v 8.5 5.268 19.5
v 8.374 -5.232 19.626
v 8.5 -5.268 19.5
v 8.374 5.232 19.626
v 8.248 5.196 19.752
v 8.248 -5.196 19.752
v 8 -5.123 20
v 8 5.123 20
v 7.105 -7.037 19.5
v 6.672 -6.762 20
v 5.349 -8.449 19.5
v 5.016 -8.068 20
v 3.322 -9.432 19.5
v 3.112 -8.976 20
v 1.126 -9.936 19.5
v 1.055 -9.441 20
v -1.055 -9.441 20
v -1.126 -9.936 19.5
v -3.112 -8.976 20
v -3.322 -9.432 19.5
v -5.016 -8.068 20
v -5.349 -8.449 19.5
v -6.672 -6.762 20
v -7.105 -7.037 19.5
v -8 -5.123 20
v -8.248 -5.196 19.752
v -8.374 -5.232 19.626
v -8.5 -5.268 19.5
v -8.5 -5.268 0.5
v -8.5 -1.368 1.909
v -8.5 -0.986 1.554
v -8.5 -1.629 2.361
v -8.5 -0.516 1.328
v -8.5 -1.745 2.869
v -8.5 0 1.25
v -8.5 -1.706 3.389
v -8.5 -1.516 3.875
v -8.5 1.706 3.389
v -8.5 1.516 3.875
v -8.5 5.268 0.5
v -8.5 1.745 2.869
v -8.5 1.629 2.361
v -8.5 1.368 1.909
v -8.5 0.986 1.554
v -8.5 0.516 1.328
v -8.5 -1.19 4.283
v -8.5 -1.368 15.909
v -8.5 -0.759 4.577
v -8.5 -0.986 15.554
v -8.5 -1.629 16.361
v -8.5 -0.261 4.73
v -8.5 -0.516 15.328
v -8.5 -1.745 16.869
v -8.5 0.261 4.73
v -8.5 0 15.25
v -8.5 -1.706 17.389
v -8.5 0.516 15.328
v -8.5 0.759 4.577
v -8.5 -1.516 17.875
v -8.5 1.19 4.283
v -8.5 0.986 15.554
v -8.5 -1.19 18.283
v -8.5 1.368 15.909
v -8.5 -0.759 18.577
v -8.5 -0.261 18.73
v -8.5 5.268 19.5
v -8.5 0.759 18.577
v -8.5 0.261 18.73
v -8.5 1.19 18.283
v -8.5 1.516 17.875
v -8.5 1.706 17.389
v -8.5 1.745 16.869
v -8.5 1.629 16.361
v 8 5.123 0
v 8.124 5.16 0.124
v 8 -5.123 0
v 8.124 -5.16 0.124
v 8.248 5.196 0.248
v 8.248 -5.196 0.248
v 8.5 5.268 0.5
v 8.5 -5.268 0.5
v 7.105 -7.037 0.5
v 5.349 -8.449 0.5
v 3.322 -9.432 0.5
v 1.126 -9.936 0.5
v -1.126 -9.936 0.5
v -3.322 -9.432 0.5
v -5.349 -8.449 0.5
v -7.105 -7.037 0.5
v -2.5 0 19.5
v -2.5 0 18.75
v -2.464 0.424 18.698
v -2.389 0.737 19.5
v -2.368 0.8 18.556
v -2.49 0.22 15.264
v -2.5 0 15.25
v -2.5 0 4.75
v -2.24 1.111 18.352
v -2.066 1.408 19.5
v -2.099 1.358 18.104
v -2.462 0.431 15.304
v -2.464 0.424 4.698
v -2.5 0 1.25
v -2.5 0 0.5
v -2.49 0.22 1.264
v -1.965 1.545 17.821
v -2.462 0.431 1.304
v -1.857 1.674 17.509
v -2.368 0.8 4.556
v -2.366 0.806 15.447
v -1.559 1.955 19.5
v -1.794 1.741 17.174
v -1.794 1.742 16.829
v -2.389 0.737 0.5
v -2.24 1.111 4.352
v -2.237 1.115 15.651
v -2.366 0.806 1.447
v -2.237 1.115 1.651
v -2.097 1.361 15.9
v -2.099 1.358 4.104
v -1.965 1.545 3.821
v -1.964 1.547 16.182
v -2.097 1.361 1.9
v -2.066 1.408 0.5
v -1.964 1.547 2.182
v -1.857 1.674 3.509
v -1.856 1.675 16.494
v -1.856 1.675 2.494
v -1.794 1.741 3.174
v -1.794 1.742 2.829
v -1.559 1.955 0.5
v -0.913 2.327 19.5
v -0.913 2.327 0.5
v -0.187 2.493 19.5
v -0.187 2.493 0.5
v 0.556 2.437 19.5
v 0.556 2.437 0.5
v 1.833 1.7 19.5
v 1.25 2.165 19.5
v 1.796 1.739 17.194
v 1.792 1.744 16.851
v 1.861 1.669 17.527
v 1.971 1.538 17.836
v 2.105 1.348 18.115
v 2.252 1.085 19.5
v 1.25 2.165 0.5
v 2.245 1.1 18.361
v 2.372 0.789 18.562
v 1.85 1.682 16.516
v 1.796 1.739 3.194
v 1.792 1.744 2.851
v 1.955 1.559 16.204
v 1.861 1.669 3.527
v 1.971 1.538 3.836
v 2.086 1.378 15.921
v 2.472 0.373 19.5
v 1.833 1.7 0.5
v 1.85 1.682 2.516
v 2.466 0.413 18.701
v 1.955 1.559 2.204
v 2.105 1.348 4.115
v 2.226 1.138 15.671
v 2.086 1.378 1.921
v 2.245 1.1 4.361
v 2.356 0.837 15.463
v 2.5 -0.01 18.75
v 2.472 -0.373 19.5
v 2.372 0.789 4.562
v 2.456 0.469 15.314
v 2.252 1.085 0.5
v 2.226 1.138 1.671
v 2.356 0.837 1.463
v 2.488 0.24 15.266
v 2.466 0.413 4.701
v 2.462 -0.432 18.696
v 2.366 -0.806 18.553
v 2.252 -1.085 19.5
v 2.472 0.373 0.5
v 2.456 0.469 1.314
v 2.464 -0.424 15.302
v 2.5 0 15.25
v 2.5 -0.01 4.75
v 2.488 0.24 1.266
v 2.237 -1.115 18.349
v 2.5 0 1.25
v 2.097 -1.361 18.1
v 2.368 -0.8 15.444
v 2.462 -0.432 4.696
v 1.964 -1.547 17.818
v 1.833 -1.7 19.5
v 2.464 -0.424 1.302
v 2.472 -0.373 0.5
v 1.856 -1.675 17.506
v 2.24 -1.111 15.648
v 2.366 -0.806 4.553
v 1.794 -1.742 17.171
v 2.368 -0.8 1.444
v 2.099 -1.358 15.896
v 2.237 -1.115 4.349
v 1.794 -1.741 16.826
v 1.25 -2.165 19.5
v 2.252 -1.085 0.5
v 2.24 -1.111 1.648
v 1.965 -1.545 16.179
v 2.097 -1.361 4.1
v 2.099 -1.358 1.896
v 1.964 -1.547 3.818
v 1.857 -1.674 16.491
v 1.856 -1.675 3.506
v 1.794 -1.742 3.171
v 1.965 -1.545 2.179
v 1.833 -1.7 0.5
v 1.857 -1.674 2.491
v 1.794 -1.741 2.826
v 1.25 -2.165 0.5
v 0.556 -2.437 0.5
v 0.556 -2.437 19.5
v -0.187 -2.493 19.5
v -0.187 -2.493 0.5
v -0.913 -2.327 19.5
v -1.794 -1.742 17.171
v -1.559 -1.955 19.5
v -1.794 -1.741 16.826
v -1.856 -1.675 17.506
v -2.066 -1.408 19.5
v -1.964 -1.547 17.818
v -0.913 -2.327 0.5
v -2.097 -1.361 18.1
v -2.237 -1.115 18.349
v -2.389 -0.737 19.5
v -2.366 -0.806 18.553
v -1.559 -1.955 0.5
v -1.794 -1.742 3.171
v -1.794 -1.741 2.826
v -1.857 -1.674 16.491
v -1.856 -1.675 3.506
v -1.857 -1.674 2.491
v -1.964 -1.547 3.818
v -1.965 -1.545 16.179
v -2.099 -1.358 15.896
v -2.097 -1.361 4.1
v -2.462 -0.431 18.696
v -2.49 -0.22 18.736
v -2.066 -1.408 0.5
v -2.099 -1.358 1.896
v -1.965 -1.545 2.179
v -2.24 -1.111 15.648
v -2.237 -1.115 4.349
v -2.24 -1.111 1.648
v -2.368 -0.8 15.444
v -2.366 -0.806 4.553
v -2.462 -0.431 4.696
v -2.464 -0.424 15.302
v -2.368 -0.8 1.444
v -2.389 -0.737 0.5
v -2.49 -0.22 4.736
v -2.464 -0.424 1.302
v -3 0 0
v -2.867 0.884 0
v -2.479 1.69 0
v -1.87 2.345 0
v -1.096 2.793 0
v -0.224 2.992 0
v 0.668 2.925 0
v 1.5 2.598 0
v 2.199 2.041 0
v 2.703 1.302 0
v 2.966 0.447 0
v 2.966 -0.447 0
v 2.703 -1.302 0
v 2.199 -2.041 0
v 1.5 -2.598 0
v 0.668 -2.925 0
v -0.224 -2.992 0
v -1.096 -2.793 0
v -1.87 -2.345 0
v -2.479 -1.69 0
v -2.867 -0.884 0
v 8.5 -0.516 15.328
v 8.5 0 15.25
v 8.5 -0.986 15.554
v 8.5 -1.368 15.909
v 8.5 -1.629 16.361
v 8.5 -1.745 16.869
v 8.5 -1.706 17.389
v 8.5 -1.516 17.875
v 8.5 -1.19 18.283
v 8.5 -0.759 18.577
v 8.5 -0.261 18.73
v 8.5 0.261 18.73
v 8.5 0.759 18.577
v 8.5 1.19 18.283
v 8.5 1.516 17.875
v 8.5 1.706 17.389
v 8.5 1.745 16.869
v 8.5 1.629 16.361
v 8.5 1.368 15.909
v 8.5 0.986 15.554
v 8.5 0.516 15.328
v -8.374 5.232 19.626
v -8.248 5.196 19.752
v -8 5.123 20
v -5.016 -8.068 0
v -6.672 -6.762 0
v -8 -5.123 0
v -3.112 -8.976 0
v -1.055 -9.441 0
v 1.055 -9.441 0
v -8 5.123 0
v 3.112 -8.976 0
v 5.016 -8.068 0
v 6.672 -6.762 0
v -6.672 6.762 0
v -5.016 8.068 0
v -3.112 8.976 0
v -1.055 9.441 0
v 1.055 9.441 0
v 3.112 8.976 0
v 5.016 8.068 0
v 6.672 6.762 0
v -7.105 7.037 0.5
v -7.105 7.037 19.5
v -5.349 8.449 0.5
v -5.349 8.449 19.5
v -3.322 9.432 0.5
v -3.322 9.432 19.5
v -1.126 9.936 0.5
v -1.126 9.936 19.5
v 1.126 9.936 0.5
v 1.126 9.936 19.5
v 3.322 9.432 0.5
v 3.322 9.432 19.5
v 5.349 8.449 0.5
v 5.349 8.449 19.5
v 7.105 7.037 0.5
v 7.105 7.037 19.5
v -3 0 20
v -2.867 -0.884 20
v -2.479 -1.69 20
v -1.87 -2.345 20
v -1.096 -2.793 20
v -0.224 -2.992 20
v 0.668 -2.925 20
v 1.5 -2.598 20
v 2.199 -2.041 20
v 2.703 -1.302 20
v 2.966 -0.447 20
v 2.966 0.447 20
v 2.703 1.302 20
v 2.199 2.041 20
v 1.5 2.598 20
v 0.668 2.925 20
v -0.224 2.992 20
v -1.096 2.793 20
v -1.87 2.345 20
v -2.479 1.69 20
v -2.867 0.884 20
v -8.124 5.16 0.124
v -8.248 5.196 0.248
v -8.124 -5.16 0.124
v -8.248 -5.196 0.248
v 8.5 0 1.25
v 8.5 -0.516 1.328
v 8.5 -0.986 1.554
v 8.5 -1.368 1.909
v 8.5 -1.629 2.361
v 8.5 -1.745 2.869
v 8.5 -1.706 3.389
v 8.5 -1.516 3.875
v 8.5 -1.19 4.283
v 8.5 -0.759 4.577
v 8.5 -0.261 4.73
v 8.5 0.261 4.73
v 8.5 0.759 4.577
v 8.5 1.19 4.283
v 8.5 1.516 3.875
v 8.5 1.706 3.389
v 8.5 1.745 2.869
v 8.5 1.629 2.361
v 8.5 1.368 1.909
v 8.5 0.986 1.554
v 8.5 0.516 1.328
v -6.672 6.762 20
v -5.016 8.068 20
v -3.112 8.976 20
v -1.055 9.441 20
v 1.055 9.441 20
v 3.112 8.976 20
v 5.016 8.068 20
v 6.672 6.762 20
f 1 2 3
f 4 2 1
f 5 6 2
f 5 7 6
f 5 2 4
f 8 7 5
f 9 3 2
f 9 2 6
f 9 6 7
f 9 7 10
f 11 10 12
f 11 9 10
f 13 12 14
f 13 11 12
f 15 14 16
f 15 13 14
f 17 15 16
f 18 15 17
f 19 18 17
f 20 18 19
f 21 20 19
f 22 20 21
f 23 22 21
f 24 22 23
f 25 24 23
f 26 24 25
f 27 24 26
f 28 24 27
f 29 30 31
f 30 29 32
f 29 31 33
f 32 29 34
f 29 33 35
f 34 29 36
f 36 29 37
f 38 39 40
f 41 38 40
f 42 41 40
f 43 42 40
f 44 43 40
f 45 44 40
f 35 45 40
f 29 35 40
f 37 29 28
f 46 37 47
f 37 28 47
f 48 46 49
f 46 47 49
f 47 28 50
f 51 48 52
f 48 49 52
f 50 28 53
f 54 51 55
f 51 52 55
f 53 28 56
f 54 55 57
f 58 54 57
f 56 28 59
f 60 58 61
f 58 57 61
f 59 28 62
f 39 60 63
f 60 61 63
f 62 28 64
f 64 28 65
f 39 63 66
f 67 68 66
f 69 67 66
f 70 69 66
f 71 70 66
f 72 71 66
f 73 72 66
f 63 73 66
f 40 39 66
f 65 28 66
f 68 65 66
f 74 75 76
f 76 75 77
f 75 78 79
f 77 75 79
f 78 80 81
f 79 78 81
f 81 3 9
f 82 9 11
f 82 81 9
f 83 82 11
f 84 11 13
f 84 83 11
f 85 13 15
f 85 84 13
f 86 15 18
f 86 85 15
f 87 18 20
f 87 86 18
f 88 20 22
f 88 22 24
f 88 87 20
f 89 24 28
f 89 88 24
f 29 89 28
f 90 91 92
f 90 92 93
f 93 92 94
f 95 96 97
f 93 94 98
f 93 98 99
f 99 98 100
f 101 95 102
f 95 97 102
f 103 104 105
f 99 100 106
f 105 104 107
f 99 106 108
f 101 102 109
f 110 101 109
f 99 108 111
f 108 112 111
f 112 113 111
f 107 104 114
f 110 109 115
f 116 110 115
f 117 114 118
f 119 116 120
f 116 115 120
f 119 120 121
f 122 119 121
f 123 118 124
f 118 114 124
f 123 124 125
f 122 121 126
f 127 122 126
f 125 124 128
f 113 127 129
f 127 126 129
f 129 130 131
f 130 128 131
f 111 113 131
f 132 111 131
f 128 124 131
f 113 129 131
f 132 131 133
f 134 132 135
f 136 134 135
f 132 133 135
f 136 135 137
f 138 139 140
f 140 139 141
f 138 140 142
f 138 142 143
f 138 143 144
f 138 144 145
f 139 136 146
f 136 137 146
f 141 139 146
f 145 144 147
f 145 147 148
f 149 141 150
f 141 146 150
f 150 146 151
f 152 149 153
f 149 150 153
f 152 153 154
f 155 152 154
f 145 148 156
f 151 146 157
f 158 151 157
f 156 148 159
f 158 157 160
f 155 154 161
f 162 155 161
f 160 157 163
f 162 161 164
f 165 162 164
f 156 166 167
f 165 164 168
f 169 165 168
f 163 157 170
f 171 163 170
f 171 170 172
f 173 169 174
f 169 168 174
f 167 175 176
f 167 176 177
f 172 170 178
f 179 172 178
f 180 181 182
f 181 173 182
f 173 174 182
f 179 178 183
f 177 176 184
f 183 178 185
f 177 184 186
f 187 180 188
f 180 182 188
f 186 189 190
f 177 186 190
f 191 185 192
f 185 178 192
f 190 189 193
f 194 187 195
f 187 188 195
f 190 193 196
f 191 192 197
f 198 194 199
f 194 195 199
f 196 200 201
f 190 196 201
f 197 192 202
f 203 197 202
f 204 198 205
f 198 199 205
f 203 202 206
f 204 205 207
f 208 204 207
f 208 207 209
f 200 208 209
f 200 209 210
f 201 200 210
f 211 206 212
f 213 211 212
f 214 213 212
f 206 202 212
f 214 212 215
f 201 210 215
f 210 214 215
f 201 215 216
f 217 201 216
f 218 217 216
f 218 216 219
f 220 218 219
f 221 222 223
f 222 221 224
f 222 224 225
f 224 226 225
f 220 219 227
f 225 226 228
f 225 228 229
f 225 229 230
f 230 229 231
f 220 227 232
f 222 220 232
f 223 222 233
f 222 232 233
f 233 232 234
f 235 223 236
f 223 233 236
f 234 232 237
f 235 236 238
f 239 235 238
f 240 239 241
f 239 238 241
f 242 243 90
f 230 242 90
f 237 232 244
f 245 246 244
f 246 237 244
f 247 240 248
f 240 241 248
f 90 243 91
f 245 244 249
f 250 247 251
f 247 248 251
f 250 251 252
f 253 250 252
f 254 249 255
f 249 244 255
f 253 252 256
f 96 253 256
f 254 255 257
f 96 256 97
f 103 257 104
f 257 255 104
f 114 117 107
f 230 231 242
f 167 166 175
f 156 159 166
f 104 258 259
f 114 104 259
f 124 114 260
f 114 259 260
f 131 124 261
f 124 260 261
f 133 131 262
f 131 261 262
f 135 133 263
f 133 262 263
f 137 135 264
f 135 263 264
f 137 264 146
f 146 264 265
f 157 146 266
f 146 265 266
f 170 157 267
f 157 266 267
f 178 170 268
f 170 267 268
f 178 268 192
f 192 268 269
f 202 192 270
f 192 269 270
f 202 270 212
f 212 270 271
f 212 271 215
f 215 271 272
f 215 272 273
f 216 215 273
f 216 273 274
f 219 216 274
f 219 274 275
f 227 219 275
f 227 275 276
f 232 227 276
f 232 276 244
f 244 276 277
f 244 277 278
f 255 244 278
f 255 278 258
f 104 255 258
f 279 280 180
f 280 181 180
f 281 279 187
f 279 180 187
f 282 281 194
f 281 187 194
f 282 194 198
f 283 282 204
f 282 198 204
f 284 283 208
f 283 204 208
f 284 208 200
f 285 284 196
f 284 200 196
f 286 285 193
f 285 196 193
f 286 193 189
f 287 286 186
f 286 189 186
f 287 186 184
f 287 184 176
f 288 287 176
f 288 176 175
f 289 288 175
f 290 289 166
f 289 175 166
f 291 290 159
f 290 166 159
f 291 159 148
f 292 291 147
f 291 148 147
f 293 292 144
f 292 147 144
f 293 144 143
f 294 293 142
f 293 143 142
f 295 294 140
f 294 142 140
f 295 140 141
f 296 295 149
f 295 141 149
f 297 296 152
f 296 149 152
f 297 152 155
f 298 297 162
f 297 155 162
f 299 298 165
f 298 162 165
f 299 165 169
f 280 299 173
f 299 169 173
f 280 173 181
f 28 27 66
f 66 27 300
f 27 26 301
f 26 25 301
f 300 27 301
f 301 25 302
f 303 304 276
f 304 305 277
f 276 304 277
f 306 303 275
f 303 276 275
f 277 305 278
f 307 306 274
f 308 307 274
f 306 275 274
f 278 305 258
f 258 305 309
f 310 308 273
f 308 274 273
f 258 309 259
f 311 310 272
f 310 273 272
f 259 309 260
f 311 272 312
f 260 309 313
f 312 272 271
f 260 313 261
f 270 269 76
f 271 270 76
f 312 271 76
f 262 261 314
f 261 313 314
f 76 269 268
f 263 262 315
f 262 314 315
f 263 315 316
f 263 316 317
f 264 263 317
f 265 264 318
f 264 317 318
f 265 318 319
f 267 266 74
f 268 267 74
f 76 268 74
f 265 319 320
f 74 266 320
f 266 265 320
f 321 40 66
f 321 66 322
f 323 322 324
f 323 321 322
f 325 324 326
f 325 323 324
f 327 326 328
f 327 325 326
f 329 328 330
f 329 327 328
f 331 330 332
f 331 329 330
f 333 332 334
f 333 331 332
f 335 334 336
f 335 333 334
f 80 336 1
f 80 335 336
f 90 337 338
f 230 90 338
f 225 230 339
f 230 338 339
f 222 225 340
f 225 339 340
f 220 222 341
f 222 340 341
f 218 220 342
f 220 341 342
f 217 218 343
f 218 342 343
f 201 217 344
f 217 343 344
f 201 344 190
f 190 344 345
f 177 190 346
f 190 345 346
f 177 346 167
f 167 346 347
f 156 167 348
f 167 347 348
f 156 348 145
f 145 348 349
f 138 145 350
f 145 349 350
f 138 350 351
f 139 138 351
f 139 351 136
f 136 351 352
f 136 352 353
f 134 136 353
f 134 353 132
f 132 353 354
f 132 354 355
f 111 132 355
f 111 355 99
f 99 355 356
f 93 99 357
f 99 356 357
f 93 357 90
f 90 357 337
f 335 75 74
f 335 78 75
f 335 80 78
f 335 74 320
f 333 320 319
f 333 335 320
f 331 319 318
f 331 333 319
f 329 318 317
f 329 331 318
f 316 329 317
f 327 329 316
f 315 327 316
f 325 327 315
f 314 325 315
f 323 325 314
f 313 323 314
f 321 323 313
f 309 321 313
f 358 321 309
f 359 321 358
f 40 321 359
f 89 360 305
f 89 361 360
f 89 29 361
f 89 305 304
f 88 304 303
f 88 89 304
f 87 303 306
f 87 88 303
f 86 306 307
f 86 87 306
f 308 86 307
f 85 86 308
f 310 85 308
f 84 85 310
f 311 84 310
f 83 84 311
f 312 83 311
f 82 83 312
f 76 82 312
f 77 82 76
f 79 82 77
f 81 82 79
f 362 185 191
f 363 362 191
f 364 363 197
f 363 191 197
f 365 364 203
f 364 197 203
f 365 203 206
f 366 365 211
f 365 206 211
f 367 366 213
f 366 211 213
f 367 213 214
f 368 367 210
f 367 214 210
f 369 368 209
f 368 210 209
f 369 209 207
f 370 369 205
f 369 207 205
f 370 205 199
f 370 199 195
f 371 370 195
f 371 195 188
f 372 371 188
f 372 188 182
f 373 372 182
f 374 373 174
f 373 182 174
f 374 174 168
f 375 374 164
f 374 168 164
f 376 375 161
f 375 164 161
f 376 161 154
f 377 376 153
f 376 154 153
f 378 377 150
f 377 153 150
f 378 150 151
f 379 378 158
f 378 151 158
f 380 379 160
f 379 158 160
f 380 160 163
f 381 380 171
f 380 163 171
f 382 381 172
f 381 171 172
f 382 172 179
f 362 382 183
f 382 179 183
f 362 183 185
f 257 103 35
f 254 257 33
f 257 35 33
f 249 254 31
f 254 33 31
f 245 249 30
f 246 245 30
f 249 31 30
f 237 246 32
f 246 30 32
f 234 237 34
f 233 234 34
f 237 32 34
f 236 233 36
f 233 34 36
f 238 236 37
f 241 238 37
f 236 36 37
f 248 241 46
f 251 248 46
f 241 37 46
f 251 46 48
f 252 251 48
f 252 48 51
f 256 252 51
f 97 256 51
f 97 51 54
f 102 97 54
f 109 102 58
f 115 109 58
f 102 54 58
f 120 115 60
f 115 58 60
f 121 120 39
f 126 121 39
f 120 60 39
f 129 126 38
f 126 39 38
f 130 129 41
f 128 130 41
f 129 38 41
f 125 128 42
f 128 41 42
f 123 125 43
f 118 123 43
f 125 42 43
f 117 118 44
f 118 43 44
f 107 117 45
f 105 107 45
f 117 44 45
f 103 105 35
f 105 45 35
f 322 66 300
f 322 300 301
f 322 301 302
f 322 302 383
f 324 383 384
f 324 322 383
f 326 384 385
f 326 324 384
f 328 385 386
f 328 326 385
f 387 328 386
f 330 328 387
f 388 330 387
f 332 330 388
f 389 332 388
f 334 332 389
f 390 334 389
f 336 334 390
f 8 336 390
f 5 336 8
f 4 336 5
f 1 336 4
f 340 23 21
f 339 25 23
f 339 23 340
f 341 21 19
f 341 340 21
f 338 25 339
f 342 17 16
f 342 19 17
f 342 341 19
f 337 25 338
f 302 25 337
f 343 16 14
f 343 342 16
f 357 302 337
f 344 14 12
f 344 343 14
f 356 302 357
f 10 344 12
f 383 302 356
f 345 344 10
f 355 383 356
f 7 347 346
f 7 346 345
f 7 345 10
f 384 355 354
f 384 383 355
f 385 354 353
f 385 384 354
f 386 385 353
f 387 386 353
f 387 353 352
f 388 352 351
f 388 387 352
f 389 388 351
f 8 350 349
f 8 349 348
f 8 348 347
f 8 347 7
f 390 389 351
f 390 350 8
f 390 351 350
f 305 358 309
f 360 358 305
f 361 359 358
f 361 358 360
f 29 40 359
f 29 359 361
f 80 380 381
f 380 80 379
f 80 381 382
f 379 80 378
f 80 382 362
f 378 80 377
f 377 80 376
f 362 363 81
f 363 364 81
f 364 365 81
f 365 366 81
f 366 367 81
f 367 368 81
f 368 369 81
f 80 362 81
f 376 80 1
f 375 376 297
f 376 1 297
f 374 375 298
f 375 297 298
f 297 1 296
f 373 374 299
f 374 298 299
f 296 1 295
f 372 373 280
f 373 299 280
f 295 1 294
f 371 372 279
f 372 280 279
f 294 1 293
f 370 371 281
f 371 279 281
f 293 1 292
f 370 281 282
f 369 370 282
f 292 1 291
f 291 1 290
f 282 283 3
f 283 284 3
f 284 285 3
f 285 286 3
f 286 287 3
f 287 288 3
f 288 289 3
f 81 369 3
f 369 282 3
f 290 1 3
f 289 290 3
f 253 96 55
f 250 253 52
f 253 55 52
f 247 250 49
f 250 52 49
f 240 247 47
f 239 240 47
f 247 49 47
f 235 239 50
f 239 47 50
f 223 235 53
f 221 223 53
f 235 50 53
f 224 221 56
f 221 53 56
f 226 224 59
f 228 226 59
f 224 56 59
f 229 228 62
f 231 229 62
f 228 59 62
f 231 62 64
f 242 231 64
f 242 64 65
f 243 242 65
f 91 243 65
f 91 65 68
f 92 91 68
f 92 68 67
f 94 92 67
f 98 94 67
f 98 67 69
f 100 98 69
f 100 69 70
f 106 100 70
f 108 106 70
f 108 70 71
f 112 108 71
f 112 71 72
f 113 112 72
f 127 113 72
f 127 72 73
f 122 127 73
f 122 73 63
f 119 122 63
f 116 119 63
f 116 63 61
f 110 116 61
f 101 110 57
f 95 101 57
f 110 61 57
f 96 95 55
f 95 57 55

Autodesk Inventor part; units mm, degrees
ref_plane "YZ Plane" through (0, 0, 0) normal (1, 0, 0) x (0, 1, 0)
ref_plane "XZ Plane" through (0, 0, 0) normal (0, 1, 0) x (-1, 0, 0)
ref_plane "XY Plane" through (0, 0, 0) normal (0, 0, 1) x (1, 0, 0)
sketch "Sketch1" plane through (0, 0, 0) normal (0, 0, 1) x (1, 0, 0)
  circle A0 centre (0, 0) radius 10
  dimension "d0" = 20
extrude "Extrusion1" add sketch "Sketch1" along normal blind 20
sketch "Sketch3" plane through (0, 0, 0) normal (0, 0, -1) x (-1, 0, 0)
  circle A0 centre (0, 0) radius 2.5
  dimension "d49" = 5
extrude "Extrusion3" cut sketch "Sketch3" against normal through all
sketch "Sketch4" plane through (0, 0, 0) normal (1, 0, 0) x (0, 1, 0)
  circle A0 centre (0, 3) radius 1.5
  line L0 (-10, 0) -> (10, 0) projected
  circle A1 centre (0, 17) radius 1.5
  line L1 (10, 20) -> (-10, 20) projected
  point P0 (0, 0)
  dimension "d9" = 3
  dimension "d10" = 3
  dimension "d11" = 3
  dimension "d12" = 3
sketch "Sketch5" plane through (0, 0, 20) normal (0, 0, 1) x (1, 0, 0)
  circle A0 centre (0, 0) radius 10 projected
  line L0 (-8.5, -5.2678) -> (-8.5, 5.2678)
  dimension "d48" = 8.5
extrude "Extrusion5" cut sketch "Sketch5" against normal blind 21.25 contours L0 A0 picked at (-8.817, 1.0892)
mirror "Mirror1" about plane through (0, 0, 0) normal (1, 0, 0) of "Extrusion5"
chamfer "Chamfer1" distance 0.5 angle 45 2 edges at (2.5, 0, 0) (2.5, 0, 20)
chamfer "Chamfer2" distance 0.5 angle 45 8 edges at (0, 10, 20) (0, -10, 20) (8.5, 0, 20) (0, 10, 0) (0, -10, 0) (8.5, 0, 0) (-8.5, 0, 0) (-8.5, 0, 20)
hole "Hole1" at (0, 0, 17) at (0, 0, 3) direction (-1, 0, 0) diameter 3.5 end through all both
thread "Thread5" size "M3.5x0.6" class "6H" standard "ANSI Metric M Profile" full length
thread "Thread6" size "M3.5x0.6" class "6H" standard "ANSI Metric M Profile" full length
thread "Thread7" size "M3.5x0.6" class "6H" standard "ANSI Metric M Profile" full length
thread "Thread8" size "M3.5x0.6" class "6H" standard "ANSI Metric M Profile" full length
properties part number "КВ33.000.106 - Муфта" material "Aluminum 6061"
